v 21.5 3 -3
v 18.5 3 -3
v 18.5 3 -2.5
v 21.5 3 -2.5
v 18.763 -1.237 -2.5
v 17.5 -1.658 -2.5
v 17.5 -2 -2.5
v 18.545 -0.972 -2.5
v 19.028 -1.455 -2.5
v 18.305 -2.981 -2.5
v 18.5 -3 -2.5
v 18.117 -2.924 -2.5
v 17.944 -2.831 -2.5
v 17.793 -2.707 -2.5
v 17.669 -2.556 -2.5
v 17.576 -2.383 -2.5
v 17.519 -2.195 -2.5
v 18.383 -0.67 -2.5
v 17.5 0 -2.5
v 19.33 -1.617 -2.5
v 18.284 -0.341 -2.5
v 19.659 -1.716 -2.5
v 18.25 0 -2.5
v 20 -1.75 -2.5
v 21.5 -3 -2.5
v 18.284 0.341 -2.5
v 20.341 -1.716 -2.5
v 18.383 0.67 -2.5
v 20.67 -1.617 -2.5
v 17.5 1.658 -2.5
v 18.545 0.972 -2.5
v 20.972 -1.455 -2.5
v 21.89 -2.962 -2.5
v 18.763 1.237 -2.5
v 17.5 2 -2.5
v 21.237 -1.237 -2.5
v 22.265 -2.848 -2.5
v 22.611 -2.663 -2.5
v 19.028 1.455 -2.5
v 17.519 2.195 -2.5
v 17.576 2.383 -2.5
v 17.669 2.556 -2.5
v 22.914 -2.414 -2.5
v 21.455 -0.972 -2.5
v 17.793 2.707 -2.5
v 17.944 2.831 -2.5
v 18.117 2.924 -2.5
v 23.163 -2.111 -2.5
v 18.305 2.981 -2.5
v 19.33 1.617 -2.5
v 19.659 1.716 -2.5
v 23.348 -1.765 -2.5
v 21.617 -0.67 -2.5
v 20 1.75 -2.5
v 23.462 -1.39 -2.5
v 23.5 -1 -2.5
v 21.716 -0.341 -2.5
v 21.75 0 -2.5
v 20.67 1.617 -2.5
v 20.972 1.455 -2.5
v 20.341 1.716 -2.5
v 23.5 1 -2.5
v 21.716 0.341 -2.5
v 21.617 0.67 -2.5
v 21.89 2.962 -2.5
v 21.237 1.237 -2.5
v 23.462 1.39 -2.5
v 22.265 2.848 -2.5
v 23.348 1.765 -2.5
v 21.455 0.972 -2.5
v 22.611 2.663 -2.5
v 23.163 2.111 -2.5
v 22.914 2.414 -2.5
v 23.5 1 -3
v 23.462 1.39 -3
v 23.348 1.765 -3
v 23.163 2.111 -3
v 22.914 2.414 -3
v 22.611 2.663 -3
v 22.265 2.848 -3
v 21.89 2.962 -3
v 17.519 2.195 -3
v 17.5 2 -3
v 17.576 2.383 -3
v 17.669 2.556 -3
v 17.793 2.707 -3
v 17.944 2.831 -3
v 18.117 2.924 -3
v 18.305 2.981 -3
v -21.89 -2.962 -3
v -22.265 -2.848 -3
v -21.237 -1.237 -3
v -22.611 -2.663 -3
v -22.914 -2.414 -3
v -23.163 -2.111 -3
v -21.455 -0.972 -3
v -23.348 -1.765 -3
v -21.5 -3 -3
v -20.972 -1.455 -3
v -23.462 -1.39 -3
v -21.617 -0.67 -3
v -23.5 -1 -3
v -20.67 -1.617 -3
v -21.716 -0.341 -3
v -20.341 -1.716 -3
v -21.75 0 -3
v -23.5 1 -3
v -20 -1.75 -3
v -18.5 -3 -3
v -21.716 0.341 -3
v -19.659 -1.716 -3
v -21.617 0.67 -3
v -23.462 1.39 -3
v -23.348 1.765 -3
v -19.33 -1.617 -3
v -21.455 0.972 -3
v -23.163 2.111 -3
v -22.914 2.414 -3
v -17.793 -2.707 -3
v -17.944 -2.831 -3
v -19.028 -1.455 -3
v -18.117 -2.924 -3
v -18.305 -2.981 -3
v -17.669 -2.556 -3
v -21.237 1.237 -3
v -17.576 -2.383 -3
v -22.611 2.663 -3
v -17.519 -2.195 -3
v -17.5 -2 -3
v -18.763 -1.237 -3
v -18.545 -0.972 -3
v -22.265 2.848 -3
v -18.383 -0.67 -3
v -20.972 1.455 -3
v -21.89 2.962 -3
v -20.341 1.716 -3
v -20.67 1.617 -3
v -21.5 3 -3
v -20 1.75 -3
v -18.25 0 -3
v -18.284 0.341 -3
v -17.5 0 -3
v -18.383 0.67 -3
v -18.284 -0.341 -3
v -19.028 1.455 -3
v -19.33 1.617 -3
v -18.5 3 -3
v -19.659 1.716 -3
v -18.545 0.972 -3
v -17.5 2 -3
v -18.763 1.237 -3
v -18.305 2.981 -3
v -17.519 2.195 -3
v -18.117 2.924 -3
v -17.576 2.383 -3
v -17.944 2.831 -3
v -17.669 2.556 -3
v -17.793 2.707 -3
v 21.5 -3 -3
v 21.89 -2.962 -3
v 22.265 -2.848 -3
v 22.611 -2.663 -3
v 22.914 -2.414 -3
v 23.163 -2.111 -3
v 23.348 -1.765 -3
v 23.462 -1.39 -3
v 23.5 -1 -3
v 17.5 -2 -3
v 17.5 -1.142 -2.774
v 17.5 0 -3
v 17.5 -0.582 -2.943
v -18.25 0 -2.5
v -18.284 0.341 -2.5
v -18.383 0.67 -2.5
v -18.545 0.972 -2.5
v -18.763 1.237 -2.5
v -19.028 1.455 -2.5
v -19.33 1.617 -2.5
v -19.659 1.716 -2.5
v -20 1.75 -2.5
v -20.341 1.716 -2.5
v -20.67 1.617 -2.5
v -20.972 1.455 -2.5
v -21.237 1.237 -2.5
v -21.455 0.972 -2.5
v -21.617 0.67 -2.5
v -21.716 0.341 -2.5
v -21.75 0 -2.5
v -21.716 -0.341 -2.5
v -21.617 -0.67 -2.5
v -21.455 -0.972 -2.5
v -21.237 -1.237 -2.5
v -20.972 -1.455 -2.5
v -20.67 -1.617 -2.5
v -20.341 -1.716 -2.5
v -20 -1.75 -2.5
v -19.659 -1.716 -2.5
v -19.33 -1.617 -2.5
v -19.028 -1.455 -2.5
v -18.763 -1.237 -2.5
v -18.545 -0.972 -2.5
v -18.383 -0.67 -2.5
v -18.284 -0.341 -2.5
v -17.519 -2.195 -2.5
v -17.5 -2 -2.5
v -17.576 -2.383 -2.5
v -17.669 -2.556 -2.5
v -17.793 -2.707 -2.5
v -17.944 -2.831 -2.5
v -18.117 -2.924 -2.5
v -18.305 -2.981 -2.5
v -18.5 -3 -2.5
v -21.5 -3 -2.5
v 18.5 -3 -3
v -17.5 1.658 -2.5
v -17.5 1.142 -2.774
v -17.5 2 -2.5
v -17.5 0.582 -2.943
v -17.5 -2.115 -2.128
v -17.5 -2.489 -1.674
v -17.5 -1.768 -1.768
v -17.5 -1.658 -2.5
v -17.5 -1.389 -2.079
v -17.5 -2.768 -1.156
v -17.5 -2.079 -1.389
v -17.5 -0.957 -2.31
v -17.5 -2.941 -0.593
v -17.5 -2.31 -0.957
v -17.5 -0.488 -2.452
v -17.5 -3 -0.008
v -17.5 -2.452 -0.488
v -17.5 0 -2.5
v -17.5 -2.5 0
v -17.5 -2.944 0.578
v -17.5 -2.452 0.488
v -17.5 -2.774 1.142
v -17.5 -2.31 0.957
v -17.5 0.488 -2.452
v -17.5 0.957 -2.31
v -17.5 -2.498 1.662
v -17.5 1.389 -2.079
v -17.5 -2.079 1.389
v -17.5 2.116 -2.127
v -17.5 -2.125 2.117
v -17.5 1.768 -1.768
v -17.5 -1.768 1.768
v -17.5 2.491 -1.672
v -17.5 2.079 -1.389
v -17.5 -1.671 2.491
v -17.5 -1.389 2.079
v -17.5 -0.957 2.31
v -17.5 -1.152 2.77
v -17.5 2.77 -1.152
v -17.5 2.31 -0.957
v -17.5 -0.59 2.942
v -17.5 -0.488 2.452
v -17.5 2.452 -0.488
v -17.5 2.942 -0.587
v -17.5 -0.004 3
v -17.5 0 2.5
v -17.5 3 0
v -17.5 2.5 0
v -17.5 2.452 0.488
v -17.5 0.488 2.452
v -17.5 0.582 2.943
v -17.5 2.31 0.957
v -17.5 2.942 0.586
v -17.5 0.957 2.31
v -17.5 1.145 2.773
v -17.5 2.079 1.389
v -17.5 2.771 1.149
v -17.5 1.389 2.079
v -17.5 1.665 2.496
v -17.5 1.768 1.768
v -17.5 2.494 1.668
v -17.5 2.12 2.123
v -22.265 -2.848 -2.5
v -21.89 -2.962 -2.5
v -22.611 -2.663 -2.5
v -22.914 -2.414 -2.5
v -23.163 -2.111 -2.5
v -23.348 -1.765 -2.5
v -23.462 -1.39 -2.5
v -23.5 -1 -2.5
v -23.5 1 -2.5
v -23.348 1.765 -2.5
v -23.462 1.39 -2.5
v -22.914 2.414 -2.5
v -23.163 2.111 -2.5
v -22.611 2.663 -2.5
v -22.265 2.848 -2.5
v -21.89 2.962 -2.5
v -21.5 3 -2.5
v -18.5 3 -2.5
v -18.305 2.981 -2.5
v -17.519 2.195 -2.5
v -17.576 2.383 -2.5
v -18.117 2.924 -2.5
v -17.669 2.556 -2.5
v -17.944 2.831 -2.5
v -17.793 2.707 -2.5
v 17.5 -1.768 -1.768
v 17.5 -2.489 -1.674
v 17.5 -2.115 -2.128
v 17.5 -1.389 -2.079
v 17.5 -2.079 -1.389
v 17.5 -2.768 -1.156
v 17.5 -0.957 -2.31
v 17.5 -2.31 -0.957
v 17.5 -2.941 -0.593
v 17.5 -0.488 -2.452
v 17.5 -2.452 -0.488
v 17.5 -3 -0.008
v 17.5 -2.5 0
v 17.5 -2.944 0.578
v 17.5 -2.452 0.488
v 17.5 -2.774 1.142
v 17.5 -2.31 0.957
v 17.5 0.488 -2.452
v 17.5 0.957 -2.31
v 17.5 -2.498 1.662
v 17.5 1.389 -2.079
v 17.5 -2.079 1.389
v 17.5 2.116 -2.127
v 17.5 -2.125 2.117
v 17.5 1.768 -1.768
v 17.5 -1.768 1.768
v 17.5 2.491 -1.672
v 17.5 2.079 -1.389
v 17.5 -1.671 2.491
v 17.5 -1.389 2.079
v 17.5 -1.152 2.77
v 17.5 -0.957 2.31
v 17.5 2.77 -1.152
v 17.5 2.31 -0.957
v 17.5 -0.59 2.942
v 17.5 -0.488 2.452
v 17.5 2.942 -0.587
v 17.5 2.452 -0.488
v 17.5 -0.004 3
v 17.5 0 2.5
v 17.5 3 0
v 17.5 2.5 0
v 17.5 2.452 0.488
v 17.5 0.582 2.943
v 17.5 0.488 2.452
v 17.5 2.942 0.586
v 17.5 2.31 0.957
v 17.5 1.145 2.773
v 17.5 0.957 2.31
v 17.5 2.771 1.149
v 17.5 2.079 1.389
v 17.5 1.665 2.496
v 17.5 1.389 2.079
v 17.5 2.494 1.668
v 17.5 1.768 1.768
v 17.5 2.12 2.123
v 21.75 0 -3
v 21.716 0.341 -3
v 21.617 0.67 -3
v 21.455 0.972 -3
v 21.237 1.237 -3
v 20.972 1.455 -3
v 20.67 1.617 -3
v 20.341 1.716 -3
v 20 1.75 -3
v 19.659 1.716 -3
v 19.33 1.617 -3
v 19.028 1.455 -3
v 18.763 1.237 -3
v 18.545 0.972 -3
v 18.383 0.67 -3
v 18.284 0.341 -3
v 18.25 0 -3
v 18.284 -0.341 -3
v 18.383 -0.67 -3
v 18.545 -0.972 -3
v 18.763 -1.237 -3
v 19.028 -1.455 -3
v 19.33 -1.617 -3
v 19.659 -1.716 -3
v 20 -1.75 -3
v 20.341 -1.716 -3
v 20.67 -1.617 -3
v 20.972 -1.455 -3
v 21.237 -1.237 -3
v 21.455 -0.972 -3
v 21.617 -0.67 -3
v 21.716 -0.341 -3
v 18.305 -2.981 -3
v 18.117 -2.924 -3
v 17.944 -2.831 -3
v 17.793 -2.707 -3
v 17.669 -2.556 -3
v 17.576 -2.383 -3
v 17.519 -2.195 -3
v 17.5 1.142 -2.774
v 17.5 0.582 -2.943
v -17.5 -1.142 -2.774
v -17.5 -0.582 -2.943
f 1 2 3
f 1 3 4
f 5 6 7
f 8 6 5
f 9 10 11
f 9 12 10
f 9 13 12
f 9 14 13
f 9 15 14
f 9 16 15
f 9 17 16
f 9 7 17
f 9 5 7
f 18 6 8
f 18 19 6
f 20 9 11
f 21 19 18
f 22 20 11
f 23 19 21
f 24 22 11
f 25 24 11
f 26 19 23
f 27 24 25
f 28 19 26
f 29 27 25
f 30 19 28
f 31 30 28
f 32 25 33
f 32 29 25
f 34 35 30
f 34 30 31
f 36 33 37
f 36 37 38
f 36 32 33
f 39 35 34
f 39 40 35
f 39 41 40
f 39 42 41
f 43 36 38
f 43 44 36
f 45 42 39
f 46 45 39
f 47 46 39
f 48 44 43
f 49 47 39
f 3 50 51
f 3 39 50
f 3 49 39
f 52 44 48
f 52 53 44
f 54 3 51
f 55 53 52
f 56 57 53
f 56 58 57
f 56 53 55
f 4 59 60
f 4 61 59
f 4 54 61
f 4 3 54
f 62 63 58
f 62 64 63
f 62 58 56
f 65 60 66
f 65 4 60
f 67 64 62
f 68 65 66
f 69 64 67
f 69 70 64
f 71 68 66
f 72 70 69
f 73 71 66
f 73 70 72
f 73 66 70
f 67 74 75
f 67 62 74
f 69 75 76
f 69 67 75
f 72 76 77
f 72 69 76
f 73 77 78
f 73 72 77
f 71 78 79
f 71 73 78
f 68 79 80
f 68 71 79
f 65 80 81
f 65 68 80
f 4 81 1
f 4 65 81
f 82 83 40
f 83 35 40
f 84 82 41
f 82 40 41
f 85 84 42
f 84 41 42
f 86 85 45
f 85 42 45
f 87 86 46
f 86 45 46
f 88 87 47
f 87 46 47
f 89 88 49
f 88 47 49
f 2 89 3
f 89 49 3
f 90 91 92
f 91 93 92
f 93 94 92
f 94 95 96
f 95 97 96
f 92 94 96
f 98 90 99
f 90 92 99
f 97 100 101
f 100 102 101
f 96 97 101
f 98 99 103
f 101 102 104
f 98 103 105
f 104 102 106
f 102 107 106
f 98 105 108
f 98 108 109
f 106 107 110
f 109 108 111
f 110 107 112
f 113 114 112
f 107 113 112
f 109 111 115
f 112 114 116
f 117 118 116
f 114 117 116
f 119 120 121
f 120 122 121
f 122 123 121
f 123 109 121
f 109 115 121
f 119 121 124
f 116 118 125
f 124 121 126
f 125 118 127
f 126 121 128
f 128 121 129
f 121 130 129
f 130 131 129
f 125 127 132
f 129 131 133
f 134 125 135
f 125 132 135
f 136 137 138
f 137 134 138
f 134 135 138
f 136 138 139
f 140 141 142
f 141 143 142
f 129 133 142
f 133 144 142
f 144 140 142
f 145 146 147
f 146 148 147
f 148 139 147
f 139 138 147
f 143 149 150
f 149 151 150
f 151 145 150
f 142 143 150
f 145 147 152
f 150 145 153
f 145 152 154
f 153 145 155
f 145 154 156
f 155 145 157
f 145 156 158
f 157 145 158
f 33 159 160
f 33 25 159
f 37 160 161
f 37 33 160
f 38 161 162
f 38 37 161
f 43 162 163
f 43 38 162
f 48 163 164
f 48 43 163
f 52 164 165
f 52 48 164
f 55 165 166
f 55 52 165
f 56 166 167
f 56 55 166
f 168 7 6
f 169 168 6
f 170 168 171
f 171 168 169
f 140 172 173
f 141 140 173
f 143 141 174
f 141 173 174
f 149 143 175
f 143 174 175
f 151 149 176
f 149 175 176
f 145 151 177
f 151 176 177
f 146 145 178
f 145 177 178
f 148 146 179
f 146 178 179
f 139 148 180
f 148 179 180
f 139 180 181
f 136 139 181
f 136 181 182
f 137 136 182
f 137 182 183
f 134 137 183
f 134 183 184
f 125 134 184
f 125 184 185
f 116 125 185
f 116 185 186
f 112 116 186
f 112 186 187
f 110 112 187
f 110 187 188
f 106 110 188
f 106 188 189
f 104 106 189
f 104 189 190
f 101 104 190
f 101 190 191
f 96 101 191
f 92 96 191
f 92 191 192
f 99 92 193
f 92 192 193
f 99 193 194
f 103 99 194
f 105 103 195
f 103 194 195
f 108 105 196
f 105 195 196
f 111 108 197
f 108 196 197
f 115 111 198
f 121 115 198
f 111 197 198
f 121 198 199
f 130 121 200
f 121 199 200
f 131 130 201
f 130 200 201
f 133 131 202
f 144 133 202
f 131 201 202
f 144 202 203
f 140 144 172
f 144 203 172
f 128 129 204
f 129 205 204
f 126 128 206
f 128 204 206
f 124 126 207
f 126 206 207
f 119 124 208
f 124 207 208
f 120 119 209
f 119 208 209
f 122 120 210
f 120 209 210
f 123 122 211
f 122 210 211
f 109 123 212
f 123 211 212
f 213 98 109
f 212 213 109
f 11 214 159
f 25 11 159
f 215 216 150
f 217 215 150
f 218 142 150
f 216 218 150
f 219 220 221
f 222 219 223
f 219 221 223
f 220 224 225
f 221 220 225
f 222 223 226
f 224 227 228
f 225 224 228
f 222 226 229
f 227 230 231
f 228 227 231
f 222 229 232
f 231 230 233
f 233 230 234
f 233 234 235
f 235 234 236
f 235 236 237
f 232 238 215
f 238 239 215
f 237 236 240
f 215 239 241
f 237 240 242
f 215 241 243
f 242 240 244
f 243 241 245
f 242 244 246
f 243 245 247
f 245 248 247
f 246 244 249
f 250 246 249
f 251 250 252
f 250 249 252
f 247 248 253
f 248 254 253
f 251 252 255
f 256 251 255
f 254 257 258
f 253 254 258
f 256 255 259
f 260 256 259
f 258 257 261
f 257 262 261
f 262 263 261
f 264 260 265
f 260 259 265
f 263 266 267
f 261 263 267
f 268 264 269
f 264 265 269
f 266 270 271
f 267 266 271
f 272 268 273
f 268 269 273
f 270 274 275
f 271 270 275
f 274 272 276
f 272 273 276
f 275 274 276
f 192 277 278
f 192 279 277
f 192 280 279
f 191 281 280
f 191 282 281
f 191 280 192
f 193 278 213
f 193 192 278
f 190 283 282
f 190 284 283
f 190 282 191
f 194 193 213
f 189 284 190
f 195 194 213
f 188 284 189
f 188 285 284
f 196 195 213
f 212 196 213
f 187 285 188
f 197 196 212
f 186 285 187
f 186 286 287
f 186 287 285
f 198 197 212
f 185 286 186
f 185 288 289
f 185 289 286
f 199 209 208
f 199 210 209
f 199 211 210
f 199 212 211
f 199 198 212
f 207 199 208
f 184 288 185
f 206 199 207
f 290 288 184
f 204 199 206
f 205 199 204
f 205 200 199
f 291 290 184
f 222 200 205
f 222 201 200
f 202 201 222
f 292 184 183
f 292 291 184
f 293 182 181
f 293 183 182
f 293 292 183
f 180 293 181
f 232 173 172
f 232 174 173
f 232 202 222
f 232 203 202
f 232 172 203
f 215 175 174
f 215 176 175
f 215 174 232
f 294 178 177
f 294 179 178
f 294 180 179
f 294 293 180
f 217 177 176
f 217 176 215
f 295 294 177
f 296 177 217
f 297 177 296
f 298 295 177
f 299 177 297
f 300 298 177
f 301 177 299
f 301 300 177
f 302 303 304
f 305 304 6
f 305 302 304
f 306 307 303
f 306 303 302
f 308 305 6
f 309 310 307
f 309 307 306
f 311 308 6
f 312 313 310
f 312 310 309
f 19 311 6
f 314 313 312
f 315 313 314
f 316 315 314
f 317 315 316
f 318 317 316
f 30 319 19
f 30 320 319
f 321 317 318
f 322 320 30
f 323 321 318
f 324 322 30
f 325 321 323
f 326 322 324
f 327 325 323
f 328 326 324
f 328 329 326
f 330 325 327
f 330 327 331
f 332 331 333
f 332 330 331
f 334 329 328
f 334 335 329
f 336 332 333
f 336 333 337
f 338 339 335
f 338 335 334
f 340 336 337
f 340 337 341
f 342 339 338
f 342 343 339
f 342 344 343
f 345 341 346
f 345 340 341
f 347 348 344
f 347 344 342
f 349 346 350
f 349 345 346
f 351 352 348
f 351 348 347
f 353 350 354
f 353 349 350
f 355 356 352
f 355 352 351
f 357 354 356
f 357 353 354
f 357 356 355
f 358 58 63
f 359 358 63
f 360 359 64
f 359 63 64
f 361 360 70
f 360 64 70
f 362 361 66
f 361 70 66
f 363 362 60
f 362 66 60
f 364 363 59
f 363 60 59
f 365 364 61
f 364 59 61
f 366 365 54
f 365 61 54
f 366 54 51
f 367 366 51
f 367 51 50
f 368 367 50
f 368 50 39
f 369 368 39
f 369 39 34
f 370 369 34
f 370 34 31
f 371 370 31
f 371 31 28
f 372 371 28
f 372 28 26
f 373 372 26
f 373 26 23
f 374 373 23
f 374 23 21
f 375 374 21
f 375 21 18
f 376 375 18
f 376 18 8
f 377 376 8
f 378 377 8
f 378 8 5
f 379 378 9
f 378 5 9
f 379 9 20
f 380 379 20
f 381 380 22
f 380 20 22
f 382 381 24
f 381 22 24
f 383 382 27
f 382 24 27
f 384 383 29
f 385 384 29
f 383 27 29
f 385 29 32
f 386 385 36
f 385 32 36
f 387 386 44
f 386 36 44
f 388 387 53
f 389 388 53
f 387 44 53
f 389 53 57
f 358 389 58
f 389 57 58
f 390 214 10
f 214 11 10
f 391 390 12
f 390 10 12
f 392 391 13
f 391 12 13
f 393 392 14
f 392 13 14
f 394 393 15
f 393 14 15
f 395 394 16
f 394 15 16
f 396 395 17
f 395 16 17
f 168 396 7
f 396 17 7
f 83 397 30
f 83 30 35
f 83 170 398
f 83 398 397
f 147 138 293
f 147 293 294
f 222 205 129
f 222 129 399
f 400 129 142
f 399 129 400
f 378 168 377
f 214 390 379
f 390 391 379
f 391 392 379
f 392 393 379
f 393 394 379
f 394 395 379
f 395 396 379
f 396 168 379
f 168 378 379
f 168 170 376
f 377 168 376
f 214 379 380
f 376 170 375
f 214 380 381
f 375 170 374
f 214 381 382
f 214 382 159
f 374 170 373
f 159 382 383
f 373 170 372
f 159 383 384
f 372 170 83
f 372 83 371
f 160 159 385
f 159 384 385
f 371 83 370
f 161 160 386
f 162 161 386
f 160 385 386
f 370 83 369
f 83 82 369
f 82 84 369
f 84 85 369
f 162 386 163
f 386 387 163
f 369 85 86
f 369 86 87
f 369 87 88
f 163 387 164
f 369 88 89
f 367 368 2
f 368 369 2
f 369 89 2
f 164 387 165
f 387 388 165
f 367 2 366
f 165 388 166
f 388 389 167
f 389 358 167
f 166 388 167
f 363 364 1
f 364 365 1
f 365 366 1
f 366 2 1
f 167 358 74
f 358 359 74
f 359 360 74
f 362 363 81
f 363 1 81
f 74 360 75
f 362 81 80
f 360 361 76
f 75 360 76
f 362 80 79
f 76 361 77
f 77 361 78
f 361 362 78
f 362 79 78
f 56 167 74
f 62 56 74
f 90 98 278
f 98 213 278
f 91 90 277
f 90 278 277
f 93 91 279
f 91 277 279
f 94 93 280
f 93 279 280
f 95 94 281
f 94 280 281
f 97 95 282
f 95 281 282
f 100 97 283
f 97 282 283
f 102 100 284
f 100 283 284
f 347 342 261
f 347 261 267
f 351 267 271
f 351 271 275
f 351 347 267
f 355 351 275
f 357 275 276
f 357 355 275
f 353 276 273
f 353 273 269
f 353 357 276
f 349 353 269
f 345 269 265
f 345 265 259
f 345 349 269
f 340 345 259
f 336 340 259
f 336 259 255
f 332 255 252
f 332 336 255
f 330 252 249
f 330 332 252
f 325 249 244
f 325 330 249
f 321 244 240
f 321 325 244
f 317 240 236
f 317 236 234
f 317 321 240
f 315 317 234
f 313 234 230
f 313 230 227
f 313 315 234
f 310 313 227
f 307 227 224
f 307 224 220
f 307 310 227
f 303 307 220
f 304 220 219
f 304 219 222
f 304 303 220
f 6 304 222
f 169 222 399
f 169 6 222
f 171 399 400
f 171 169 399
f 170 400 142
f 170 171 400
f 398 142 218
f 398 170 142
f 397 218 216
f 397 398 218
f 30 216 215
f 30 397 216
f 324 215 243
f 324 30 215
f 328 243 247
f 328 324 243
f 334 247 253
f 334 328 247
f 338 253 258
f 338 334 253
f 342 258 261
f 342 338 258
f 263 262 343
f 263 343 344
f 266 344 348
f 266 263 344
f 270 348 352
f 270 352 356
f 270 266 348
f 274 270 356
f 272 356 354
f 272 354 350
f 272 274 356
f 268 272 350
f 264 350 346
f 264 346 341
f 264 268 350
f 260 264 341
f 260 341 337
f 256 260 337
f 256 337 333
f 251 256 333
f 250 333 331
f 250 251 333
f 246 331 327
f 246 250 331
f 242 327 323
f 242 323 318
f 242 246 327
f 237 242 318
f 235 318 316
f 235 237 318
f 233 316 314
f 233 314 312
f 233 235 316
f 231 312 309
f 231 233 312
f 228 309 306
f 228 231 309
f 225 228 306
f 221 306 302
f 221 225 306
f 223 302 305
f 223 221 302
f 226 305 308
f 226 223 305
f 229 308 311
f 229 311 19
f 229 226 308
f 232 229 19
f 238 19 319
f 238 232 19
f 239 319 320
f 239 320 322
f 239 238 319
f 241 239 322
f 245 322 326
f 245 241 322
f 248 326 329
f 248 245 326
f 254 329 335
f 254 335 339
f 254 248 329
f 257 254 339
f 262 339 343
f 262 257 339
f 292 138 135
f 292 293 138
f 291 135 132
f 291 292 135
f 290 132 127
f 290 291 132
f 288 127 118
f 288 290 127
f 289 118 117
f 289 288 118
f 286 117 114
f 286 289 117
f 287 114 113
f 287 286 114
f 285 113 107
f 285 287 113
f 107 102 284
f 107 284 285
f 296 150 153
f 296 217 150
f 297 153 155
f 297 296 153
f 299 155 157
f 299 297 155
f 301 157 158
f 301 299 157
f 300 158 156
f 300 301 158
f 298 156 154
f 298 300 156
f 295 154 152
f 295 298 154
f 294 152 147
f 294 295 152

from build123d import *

# Parameters (mm, degrees)
F0_R     = 3
F0_R_2   = 2.5
F1_DEPTH = 17.5
F3_W     = 6
F3_H     = 6
F4_DEPTH = 0.5
F6_R     = 2
F7_R     = 1
F5_R     = 1.75
F8_DEPTH = 25


with BuildPart() as f1:
    # F0 (on Right) → F1 (new body, symmetric)
    with BuildSketch(Plane.YZ):
        Circle(F0_R)
        Circle(F0_R_2, mode=Mode.SUBTRACT)
    extrude(amount=F1_DEPTH, both=True)

    # F3 (on offset) → F4 (join)
    with BuildSketch(Plane.XY.offset(-3)):
        with Locations((20.5, 0)):
            Rectangle(F3_W, F3_H)
        with Locations((-20.5, 0)):
            Rectangle(F3_W, F3_H)
    extrude(amount=F4_DEPTH)

    # F6
    f6_edges = [f1.edges().sort_by_distance(p)[0] for p in [
        (23.5, 3, -2.75),
        (23.5, -3, -2.75),
        (-23.5, -3, -2.75),
        (-23.5, 3, -2.75),
    ]]
    fillet(f6_edges, radius=F6_R)

    # F7
    f7_edges = [f1.edges().sort_by_distance(p)[0] for p in [
        (17.5, -3, -2.75),
        (17.5, 3, -2.75),
        (-17.5, -3, -2.75),
        (-17.5, 3, -2.75),
    ]]
    fillet(f7_edges, radius=F7_R)

    # F5 (on face) → F8 (cut)
    with BuildSketch(Plane.XY.offset(-2.5)):
        with Locations((20, 0)):
            Circle(F5_R)
        with Locations((-20, 0)):
            Circle(F5_R)
    extrude(amount=-F8_DEPTH, mode=Mode.SUBTRACT)


solid = f1.part
